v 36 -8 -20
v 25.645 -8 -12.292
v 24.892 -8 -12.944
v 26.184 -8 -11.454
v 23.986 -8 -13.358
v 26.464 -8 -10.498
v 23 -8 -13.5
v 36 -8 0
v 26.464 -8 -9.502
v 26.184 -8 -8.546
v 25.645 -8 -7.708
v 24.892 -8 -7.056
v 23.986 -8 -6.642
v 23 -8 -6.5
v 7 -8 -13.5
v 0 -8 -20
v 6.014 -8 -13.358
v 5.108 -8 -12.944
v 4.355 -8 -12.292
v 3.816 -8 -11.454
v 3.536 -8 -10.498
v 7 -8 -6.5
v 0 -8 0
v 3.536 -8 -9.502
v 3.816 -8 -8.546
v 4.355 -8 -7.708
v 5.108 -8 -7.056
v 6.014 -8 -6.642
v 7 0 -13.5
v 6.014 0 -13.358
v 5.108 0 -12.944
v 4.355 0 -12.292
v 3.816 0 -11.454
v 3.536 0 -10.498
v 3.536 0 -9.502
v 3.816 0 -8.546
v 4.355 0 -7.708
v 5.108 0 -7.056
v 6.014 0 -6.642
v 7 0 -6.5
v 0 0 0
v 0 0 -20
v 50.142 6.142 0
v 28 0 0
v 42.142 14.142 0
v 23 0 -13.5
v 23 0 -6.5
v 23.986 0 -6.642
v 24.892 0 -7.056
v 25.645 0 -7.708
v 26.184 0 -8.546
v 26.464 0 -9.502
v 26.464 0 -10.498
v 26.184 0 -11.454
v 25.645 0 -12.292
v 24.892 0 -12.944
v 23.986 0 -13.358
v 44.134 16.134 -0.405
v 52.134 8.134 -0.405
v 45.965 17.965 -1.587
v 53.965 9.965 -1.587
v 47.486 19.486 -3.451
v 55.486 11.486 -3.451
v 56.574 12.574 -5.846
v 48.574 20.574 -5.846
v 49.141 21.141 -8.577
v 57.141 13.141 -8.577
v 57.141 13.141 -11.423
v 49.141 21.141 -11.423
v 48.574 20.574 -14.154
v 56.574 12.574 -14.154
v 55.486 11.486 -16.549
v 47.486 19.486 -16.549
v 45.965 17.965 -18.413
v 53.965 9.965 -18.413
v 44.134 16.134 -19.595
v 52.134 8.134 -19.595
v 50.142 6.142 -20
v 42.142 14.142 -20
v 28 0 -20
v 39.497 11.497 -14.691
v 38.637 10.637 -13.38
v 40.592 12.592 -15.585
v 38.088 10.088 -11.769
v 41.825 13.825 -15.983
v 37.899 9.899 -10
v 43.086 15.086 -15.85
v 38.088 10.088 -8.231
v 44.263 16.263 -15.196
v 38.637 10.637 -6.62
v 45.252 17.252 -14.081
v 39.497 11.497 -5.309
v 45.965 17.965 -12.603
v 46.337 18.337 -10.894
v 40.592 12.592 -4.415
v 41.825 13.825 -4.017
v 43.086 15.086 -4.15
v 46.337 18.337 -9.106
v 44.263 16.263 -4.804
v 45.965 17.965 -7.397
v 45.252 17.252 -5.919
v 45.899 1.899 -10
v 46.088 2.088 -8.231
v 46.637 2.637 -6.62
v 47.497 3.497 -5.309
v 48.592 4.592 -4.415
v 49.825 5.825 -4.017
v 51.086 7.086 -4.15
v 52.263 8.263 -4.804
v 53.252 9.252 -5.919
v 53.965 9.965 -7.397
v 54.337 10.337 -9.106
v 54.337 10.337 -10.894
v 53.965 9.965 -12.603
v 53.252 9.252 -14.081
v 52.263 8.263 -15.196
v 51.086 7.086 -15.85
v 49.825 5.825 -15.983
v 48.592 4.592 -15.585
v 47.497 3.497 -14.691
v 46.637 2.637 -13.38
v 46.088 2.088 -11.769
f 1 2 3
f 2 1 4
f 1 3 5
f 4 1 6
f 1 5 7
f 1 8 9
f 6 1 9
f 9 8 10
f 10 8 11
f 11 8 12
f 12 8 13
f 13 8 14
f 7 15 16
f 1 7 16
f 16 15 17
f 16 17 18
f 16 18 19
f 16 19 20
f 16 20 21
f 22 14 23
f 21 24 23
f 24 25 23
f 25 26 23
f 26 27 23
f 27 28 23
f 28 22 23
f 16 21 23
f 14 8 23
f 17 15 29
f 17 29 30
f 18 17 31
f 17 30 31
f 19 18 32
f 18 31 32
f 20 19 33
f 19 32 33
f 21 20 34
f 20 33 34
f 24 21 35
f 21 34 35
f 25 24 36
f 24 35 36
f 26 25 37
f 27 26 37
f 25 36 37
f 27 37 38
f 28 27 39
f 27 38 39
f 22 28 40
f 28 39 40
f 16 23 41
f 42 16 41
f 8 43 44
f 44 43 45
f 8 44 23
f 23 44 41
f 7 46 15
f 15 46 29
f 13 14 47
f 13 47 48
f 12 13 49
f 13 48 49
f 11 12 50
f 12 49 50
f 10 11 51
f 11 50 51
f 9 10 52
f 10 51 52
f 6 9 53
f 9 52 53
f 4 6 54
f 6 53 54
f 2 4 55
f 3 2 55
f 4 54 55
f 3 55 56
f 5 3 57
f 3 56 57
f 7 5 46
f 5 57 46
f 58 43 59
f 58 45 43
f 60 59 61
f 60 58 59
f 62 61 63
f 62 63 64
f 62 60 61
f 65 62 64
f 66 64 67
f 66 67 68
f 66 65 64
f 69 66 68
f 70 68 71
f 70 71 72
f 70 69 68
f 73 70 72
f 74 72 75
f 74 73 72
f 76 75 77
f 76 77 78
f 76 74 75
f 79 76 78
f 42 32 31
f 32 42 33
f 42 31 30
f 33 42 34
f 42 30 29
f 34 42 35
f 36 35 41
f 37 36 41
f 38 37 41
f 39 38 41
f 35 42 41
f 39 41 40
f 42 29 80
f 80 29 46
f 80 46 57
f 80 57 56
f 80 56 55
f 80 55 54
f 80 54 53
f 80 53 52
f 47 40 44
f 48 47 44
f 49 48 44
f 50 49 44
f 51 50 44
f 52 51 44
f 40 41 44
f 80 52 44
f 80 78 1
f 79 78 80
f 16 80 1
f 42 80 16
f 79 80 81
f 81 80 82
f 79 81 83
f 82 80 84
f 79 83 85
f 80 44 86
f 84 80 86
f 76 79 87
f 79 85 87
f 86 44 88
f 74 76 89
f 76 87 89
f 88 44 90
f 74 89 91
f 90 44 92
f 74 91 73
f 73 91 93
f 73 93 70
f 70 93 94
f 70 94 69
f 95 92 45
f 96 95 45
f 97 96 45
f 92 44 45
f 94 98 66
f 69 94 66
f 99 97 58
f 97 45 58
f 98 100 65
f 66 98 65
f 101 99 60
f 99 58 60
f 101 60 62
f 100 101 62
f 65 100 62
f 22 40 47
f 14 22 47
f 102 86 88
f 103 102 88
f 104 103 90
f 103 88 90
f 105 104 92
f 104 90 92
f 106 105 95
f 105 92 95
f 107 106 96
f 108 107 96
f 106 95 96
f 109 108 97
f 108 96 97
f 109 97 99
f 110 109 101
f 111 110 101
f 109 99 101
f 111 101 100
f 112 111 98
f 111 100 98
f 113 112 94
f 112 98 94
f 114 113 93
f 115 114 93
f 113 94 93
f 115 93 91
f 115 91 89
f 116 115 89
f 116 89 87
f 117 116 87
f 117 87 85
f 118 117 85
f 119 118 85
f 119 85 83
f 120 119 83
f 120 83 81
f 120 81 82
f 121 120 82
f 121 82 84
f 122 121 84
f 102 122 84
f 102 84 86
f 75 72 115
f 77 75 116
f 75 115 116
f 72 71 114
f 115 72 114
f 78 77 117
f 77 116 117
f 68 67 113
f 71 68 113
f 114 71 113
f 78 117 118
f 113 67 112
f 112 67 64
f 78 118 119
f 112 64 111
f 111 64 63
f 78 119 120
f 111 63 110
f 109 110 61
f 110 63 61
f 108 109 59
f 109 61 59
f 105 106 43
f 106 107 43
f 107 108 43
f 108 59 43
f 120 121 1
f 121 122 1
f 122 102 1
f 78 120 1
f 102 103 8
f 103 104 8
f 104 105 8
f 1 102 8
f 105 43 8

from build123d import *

# Parameters (mm, degrees)
EXTRUDE_1_DEPTH     = 20
FILLET_1_RADIUS     = 10
FILLET_1_LENGTH     = 11.313708499
SKETCH_4_R          = 6
CUT_EXTRUDE_1_DEPTH = 60.222889557
CUT_EXTRUDE_2_DEPTH = 65.213321417


with BuildPart() as part:
    # 草图1 → 凸台-拉伸1 (new body)
    with BuildSketch(Plane.XY):
        Polygon((0, 0), (28, 0), (49.213203436, 21.213203436), (57.213203436, 13.213203436), (36, -8), (0, -8), align=None)
    extrude(amount=-EXTRUDE_1_DEPTH)

    # 圆角1: full round fillet: the end face becomes a half cylinder, R = half its width
    fillet_1_face = Plane((53.213203436, 17.213203436, -10), x_dir=(-0.707106781187, 0.707106781187, 0), z_dir=(0.707106781187, 0.707106781187, 0))  # on the end face: x along it, z out of the body
    fillet_1_slab = fillet_1_face.offset(-FILLET_1_RADIUS / 2) * Box(FILLET_1_LENGTH, 2 * FILLET_1_RADIUS, FILLET_1_RADIUS, mode=Mode.PRIVATE)  # the body's end, R deep
    fillet_1_round = Plane((46.142135624, 10.142135624, -10), x_dir=(0.707106781187, 0.707106781187, 0), z_dir=(-0.707106781187, 0.707106781187, 0)) * Cylinder(FILLET_1_RADIUS, FILLET_1_LENGTH, mode=Mode.PRIVATE)  # its axis R under the face
    add(fillet_1_slab - fillet_1_round, mode=Mode.SUBTRACT)

    # 草图4 → 切除-拉伸1 (cut, through all)
    with BuildSketch(Plane(origin=(14, -14, 0), x_dir=(0, 0, 1), z_dir=(-0.7071067811865488, 0.7071067811865462, 0))):
        with Locations(Location((-10, 39.798989873, 0), (0, 0, 270))):
            Circle(SKETCH_4_R)
    extrude(amount=-CUT_EXTRUDE_1_DEPTH, mode=Mode.SUBTRACT)

    # 草图2 → 切除-拉伸2 (cut, through all)
    with BuildSketch(Plane(origin=(0, 0, 0), x_dir=(1, 0, 0), z_dir=(0, 1, 0))):
        with BuildLine():
            Line((7, 6.5), (23, 6.5))
            ThreePointArc((23, 6.5), (26.5, 10), (23, 13.5))
            Line((23, 13.5), (7, 13.5))
            ThreePointArc((7, 13.5), (3.5, 10), (7, 6.5))
        make_face()
    extrude(amount=-CUT_EXTRUDE_2_DEPTH, mode=Mode.SUBTRACT)


solid = part.part
